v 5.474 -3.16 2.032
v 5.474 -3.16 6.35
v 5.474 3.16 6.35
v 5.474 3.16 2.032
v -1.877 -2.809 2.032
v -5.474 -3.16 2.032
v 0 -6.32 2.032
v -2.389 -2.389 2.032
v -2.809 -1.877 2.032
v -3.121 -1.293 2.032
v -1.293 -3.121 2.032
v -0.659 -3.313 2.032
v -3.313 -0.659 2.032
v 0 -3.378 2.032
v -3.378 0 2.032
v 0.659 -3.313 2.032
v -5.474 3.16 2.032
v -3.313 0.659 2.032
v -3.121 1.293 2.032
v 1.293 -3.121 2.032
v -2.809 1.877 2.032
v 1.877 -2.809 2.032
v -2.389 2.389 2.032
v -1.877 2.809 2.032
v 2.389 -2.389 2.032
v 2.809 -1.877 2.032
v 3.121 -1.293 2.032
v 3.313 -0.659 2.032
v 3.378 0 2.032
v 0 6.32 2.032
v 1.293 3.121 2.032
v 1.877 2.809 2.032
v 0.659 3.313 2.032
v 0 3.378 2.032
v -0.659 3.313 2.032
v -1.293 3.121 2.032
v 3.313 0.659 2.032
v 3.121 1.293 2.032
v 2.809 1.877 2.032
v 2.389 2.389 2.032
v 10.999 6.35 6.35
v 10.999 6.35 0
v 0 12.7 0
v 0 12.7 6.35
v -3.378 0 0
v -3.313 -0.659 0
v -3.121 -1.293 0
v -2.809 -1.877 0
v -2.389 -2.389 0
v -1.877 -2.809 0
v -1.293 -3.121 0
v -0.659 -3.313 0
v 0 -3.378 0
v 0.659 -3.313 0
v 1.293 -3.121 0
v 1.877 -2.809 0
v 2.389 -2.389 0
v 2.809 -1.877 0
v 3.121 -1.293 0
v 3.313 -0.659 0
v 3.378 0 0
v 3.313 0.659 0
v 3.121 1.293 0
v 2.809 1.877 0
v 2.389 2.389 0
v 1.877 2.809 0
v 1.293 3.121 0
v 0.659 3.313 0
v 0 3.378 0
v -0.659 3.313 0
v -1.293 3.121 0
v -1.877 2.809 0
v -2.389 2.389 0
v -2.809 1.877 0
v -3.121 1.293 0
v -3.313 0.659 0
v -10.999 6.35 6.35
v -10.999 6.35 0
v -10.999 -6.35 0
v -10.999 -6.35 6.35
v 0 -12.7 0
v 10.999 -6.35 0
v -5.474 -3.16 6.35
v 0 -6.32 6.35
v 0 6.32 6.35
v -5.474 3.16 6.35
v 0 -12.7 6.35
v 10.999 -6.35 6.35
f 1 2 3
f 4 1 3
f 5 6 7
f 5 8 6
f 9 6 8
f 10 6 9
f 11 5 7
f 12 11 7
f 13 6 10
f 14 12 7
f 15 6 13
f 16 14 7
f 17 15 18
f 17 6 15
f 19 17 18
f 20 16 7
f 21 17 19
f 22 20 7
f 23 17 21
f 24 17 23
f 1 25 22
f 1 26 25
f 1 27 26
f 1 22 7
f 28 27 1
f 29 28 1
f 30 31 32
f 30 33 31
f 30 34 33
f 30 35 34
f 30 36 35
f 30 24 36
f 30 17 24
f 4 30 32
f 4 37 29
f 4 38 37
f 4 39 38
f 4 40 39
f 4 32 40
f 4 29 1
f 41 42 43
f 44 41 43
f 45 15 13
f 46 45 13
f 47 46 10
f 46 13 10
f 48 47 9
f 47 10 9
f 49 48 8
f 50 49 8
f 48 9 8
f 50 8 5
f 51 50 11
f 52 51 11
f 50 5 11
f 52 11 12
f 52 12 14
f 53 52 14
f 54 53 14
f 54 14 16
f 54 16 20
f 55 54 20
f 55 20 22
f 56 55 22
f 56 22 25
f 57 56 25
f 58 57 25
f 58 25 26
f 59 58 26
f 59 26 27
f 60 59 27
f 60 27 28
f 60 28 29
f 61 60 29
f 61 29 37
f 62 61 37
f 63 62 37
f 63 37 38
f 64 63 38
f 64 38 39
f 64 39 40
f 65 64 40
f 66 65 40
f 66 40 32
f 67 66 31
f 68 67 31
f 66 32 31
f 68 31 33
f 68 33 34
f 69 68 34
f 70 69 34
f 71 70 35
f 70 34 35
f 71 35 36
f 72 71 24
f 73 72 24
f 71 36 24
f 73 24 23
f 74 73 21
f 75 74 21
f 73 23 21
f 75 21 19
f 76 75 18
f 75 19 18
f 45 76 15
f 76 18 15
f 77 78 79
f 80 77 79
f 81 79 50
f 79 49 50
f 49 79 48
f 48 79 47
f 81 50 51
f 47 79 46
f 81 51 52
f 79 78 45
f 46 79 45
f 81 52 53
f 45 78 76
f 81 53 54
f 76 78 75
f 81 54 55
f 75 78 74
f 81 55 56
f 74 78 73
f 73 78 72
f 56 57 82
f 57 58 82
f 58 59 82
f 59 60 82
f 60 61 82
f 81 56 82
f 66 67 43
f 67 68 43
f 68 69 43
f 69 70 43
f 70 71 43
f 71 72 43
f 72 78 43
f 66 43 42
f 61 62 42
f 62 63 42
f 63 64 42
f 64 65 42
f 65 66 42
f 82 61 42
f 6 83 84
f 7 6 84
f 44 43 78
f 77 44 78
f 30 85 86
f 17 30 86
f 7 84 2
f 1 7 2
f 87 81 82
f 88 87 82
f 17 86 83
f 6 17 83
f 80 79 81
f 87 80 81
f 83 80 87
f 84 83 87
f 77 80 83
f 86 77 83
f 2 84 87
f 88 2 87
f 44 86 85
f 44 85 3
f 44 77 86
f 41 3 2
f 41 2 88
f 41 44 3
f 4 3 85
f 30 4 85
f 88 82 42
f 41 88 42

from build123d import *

# Parameters (mm, degrees)
F0_R     = 3.2385
F1_DEPTH = 6.35
F3_DEPTH = 4.318
F4_D     = 6.7564


with BuildPart() as f1:
    # F0 (on Top) → F1 (new body)
    with BuildSketch(Plane.XY):
        Polygon((0, -12.7), (10.9985226281, -6.35), (10.9985226281, 6.35), (0, 12.7), (-10.9985226281, 6.35), (-10.9985226281, -6.35), align=None)
        Polygon((0, 6.3204843369), (5.4737, 3.1602421685), (5.4737, -3.1602421685), (0, -6.3204843369), (-5.4737, -3.1602421685), (-5.4737, 3.1602421685), align=None, mode=Mode.SUBTRACT)
        Polygon((5.4737, -3.1602421685), (5.4737, 3.1602421685), (0, 6.3204843369), (-5.4737, 3.1602421685), (-5.4737, -3.1602421685), (0, -6.3204843369), align=None)
        Circle(F0_R, mode=Mode.SUBTRACT)
        Circle(F0_R)
    extrude(amount=F1_DEPTH)

    # F2 (on face) → F3 (cut)
    with BuildSketch(Plane.XY.offset(6.35)):
        Polygon((0, 6.3204843369), (-5.4737, 3.1602421685), (-5.4737, -3.1602421685), (0, -6.3204843369), (5.4737, -3.1602421685), (5.4737, 3.1602421685), align=None)
    extrude(amount=-F3_DEPTH, mode=Mode.SUBTRACT)

    # F4 (through all)
    with Locations(Plane(origin=(0, 0, 0), x_dir=(1, 0, 0), z_dir=(0, 0, -1))):
        with Locations((0, 0)):
            Hole(F4_D / 2)


solid = f1.part
